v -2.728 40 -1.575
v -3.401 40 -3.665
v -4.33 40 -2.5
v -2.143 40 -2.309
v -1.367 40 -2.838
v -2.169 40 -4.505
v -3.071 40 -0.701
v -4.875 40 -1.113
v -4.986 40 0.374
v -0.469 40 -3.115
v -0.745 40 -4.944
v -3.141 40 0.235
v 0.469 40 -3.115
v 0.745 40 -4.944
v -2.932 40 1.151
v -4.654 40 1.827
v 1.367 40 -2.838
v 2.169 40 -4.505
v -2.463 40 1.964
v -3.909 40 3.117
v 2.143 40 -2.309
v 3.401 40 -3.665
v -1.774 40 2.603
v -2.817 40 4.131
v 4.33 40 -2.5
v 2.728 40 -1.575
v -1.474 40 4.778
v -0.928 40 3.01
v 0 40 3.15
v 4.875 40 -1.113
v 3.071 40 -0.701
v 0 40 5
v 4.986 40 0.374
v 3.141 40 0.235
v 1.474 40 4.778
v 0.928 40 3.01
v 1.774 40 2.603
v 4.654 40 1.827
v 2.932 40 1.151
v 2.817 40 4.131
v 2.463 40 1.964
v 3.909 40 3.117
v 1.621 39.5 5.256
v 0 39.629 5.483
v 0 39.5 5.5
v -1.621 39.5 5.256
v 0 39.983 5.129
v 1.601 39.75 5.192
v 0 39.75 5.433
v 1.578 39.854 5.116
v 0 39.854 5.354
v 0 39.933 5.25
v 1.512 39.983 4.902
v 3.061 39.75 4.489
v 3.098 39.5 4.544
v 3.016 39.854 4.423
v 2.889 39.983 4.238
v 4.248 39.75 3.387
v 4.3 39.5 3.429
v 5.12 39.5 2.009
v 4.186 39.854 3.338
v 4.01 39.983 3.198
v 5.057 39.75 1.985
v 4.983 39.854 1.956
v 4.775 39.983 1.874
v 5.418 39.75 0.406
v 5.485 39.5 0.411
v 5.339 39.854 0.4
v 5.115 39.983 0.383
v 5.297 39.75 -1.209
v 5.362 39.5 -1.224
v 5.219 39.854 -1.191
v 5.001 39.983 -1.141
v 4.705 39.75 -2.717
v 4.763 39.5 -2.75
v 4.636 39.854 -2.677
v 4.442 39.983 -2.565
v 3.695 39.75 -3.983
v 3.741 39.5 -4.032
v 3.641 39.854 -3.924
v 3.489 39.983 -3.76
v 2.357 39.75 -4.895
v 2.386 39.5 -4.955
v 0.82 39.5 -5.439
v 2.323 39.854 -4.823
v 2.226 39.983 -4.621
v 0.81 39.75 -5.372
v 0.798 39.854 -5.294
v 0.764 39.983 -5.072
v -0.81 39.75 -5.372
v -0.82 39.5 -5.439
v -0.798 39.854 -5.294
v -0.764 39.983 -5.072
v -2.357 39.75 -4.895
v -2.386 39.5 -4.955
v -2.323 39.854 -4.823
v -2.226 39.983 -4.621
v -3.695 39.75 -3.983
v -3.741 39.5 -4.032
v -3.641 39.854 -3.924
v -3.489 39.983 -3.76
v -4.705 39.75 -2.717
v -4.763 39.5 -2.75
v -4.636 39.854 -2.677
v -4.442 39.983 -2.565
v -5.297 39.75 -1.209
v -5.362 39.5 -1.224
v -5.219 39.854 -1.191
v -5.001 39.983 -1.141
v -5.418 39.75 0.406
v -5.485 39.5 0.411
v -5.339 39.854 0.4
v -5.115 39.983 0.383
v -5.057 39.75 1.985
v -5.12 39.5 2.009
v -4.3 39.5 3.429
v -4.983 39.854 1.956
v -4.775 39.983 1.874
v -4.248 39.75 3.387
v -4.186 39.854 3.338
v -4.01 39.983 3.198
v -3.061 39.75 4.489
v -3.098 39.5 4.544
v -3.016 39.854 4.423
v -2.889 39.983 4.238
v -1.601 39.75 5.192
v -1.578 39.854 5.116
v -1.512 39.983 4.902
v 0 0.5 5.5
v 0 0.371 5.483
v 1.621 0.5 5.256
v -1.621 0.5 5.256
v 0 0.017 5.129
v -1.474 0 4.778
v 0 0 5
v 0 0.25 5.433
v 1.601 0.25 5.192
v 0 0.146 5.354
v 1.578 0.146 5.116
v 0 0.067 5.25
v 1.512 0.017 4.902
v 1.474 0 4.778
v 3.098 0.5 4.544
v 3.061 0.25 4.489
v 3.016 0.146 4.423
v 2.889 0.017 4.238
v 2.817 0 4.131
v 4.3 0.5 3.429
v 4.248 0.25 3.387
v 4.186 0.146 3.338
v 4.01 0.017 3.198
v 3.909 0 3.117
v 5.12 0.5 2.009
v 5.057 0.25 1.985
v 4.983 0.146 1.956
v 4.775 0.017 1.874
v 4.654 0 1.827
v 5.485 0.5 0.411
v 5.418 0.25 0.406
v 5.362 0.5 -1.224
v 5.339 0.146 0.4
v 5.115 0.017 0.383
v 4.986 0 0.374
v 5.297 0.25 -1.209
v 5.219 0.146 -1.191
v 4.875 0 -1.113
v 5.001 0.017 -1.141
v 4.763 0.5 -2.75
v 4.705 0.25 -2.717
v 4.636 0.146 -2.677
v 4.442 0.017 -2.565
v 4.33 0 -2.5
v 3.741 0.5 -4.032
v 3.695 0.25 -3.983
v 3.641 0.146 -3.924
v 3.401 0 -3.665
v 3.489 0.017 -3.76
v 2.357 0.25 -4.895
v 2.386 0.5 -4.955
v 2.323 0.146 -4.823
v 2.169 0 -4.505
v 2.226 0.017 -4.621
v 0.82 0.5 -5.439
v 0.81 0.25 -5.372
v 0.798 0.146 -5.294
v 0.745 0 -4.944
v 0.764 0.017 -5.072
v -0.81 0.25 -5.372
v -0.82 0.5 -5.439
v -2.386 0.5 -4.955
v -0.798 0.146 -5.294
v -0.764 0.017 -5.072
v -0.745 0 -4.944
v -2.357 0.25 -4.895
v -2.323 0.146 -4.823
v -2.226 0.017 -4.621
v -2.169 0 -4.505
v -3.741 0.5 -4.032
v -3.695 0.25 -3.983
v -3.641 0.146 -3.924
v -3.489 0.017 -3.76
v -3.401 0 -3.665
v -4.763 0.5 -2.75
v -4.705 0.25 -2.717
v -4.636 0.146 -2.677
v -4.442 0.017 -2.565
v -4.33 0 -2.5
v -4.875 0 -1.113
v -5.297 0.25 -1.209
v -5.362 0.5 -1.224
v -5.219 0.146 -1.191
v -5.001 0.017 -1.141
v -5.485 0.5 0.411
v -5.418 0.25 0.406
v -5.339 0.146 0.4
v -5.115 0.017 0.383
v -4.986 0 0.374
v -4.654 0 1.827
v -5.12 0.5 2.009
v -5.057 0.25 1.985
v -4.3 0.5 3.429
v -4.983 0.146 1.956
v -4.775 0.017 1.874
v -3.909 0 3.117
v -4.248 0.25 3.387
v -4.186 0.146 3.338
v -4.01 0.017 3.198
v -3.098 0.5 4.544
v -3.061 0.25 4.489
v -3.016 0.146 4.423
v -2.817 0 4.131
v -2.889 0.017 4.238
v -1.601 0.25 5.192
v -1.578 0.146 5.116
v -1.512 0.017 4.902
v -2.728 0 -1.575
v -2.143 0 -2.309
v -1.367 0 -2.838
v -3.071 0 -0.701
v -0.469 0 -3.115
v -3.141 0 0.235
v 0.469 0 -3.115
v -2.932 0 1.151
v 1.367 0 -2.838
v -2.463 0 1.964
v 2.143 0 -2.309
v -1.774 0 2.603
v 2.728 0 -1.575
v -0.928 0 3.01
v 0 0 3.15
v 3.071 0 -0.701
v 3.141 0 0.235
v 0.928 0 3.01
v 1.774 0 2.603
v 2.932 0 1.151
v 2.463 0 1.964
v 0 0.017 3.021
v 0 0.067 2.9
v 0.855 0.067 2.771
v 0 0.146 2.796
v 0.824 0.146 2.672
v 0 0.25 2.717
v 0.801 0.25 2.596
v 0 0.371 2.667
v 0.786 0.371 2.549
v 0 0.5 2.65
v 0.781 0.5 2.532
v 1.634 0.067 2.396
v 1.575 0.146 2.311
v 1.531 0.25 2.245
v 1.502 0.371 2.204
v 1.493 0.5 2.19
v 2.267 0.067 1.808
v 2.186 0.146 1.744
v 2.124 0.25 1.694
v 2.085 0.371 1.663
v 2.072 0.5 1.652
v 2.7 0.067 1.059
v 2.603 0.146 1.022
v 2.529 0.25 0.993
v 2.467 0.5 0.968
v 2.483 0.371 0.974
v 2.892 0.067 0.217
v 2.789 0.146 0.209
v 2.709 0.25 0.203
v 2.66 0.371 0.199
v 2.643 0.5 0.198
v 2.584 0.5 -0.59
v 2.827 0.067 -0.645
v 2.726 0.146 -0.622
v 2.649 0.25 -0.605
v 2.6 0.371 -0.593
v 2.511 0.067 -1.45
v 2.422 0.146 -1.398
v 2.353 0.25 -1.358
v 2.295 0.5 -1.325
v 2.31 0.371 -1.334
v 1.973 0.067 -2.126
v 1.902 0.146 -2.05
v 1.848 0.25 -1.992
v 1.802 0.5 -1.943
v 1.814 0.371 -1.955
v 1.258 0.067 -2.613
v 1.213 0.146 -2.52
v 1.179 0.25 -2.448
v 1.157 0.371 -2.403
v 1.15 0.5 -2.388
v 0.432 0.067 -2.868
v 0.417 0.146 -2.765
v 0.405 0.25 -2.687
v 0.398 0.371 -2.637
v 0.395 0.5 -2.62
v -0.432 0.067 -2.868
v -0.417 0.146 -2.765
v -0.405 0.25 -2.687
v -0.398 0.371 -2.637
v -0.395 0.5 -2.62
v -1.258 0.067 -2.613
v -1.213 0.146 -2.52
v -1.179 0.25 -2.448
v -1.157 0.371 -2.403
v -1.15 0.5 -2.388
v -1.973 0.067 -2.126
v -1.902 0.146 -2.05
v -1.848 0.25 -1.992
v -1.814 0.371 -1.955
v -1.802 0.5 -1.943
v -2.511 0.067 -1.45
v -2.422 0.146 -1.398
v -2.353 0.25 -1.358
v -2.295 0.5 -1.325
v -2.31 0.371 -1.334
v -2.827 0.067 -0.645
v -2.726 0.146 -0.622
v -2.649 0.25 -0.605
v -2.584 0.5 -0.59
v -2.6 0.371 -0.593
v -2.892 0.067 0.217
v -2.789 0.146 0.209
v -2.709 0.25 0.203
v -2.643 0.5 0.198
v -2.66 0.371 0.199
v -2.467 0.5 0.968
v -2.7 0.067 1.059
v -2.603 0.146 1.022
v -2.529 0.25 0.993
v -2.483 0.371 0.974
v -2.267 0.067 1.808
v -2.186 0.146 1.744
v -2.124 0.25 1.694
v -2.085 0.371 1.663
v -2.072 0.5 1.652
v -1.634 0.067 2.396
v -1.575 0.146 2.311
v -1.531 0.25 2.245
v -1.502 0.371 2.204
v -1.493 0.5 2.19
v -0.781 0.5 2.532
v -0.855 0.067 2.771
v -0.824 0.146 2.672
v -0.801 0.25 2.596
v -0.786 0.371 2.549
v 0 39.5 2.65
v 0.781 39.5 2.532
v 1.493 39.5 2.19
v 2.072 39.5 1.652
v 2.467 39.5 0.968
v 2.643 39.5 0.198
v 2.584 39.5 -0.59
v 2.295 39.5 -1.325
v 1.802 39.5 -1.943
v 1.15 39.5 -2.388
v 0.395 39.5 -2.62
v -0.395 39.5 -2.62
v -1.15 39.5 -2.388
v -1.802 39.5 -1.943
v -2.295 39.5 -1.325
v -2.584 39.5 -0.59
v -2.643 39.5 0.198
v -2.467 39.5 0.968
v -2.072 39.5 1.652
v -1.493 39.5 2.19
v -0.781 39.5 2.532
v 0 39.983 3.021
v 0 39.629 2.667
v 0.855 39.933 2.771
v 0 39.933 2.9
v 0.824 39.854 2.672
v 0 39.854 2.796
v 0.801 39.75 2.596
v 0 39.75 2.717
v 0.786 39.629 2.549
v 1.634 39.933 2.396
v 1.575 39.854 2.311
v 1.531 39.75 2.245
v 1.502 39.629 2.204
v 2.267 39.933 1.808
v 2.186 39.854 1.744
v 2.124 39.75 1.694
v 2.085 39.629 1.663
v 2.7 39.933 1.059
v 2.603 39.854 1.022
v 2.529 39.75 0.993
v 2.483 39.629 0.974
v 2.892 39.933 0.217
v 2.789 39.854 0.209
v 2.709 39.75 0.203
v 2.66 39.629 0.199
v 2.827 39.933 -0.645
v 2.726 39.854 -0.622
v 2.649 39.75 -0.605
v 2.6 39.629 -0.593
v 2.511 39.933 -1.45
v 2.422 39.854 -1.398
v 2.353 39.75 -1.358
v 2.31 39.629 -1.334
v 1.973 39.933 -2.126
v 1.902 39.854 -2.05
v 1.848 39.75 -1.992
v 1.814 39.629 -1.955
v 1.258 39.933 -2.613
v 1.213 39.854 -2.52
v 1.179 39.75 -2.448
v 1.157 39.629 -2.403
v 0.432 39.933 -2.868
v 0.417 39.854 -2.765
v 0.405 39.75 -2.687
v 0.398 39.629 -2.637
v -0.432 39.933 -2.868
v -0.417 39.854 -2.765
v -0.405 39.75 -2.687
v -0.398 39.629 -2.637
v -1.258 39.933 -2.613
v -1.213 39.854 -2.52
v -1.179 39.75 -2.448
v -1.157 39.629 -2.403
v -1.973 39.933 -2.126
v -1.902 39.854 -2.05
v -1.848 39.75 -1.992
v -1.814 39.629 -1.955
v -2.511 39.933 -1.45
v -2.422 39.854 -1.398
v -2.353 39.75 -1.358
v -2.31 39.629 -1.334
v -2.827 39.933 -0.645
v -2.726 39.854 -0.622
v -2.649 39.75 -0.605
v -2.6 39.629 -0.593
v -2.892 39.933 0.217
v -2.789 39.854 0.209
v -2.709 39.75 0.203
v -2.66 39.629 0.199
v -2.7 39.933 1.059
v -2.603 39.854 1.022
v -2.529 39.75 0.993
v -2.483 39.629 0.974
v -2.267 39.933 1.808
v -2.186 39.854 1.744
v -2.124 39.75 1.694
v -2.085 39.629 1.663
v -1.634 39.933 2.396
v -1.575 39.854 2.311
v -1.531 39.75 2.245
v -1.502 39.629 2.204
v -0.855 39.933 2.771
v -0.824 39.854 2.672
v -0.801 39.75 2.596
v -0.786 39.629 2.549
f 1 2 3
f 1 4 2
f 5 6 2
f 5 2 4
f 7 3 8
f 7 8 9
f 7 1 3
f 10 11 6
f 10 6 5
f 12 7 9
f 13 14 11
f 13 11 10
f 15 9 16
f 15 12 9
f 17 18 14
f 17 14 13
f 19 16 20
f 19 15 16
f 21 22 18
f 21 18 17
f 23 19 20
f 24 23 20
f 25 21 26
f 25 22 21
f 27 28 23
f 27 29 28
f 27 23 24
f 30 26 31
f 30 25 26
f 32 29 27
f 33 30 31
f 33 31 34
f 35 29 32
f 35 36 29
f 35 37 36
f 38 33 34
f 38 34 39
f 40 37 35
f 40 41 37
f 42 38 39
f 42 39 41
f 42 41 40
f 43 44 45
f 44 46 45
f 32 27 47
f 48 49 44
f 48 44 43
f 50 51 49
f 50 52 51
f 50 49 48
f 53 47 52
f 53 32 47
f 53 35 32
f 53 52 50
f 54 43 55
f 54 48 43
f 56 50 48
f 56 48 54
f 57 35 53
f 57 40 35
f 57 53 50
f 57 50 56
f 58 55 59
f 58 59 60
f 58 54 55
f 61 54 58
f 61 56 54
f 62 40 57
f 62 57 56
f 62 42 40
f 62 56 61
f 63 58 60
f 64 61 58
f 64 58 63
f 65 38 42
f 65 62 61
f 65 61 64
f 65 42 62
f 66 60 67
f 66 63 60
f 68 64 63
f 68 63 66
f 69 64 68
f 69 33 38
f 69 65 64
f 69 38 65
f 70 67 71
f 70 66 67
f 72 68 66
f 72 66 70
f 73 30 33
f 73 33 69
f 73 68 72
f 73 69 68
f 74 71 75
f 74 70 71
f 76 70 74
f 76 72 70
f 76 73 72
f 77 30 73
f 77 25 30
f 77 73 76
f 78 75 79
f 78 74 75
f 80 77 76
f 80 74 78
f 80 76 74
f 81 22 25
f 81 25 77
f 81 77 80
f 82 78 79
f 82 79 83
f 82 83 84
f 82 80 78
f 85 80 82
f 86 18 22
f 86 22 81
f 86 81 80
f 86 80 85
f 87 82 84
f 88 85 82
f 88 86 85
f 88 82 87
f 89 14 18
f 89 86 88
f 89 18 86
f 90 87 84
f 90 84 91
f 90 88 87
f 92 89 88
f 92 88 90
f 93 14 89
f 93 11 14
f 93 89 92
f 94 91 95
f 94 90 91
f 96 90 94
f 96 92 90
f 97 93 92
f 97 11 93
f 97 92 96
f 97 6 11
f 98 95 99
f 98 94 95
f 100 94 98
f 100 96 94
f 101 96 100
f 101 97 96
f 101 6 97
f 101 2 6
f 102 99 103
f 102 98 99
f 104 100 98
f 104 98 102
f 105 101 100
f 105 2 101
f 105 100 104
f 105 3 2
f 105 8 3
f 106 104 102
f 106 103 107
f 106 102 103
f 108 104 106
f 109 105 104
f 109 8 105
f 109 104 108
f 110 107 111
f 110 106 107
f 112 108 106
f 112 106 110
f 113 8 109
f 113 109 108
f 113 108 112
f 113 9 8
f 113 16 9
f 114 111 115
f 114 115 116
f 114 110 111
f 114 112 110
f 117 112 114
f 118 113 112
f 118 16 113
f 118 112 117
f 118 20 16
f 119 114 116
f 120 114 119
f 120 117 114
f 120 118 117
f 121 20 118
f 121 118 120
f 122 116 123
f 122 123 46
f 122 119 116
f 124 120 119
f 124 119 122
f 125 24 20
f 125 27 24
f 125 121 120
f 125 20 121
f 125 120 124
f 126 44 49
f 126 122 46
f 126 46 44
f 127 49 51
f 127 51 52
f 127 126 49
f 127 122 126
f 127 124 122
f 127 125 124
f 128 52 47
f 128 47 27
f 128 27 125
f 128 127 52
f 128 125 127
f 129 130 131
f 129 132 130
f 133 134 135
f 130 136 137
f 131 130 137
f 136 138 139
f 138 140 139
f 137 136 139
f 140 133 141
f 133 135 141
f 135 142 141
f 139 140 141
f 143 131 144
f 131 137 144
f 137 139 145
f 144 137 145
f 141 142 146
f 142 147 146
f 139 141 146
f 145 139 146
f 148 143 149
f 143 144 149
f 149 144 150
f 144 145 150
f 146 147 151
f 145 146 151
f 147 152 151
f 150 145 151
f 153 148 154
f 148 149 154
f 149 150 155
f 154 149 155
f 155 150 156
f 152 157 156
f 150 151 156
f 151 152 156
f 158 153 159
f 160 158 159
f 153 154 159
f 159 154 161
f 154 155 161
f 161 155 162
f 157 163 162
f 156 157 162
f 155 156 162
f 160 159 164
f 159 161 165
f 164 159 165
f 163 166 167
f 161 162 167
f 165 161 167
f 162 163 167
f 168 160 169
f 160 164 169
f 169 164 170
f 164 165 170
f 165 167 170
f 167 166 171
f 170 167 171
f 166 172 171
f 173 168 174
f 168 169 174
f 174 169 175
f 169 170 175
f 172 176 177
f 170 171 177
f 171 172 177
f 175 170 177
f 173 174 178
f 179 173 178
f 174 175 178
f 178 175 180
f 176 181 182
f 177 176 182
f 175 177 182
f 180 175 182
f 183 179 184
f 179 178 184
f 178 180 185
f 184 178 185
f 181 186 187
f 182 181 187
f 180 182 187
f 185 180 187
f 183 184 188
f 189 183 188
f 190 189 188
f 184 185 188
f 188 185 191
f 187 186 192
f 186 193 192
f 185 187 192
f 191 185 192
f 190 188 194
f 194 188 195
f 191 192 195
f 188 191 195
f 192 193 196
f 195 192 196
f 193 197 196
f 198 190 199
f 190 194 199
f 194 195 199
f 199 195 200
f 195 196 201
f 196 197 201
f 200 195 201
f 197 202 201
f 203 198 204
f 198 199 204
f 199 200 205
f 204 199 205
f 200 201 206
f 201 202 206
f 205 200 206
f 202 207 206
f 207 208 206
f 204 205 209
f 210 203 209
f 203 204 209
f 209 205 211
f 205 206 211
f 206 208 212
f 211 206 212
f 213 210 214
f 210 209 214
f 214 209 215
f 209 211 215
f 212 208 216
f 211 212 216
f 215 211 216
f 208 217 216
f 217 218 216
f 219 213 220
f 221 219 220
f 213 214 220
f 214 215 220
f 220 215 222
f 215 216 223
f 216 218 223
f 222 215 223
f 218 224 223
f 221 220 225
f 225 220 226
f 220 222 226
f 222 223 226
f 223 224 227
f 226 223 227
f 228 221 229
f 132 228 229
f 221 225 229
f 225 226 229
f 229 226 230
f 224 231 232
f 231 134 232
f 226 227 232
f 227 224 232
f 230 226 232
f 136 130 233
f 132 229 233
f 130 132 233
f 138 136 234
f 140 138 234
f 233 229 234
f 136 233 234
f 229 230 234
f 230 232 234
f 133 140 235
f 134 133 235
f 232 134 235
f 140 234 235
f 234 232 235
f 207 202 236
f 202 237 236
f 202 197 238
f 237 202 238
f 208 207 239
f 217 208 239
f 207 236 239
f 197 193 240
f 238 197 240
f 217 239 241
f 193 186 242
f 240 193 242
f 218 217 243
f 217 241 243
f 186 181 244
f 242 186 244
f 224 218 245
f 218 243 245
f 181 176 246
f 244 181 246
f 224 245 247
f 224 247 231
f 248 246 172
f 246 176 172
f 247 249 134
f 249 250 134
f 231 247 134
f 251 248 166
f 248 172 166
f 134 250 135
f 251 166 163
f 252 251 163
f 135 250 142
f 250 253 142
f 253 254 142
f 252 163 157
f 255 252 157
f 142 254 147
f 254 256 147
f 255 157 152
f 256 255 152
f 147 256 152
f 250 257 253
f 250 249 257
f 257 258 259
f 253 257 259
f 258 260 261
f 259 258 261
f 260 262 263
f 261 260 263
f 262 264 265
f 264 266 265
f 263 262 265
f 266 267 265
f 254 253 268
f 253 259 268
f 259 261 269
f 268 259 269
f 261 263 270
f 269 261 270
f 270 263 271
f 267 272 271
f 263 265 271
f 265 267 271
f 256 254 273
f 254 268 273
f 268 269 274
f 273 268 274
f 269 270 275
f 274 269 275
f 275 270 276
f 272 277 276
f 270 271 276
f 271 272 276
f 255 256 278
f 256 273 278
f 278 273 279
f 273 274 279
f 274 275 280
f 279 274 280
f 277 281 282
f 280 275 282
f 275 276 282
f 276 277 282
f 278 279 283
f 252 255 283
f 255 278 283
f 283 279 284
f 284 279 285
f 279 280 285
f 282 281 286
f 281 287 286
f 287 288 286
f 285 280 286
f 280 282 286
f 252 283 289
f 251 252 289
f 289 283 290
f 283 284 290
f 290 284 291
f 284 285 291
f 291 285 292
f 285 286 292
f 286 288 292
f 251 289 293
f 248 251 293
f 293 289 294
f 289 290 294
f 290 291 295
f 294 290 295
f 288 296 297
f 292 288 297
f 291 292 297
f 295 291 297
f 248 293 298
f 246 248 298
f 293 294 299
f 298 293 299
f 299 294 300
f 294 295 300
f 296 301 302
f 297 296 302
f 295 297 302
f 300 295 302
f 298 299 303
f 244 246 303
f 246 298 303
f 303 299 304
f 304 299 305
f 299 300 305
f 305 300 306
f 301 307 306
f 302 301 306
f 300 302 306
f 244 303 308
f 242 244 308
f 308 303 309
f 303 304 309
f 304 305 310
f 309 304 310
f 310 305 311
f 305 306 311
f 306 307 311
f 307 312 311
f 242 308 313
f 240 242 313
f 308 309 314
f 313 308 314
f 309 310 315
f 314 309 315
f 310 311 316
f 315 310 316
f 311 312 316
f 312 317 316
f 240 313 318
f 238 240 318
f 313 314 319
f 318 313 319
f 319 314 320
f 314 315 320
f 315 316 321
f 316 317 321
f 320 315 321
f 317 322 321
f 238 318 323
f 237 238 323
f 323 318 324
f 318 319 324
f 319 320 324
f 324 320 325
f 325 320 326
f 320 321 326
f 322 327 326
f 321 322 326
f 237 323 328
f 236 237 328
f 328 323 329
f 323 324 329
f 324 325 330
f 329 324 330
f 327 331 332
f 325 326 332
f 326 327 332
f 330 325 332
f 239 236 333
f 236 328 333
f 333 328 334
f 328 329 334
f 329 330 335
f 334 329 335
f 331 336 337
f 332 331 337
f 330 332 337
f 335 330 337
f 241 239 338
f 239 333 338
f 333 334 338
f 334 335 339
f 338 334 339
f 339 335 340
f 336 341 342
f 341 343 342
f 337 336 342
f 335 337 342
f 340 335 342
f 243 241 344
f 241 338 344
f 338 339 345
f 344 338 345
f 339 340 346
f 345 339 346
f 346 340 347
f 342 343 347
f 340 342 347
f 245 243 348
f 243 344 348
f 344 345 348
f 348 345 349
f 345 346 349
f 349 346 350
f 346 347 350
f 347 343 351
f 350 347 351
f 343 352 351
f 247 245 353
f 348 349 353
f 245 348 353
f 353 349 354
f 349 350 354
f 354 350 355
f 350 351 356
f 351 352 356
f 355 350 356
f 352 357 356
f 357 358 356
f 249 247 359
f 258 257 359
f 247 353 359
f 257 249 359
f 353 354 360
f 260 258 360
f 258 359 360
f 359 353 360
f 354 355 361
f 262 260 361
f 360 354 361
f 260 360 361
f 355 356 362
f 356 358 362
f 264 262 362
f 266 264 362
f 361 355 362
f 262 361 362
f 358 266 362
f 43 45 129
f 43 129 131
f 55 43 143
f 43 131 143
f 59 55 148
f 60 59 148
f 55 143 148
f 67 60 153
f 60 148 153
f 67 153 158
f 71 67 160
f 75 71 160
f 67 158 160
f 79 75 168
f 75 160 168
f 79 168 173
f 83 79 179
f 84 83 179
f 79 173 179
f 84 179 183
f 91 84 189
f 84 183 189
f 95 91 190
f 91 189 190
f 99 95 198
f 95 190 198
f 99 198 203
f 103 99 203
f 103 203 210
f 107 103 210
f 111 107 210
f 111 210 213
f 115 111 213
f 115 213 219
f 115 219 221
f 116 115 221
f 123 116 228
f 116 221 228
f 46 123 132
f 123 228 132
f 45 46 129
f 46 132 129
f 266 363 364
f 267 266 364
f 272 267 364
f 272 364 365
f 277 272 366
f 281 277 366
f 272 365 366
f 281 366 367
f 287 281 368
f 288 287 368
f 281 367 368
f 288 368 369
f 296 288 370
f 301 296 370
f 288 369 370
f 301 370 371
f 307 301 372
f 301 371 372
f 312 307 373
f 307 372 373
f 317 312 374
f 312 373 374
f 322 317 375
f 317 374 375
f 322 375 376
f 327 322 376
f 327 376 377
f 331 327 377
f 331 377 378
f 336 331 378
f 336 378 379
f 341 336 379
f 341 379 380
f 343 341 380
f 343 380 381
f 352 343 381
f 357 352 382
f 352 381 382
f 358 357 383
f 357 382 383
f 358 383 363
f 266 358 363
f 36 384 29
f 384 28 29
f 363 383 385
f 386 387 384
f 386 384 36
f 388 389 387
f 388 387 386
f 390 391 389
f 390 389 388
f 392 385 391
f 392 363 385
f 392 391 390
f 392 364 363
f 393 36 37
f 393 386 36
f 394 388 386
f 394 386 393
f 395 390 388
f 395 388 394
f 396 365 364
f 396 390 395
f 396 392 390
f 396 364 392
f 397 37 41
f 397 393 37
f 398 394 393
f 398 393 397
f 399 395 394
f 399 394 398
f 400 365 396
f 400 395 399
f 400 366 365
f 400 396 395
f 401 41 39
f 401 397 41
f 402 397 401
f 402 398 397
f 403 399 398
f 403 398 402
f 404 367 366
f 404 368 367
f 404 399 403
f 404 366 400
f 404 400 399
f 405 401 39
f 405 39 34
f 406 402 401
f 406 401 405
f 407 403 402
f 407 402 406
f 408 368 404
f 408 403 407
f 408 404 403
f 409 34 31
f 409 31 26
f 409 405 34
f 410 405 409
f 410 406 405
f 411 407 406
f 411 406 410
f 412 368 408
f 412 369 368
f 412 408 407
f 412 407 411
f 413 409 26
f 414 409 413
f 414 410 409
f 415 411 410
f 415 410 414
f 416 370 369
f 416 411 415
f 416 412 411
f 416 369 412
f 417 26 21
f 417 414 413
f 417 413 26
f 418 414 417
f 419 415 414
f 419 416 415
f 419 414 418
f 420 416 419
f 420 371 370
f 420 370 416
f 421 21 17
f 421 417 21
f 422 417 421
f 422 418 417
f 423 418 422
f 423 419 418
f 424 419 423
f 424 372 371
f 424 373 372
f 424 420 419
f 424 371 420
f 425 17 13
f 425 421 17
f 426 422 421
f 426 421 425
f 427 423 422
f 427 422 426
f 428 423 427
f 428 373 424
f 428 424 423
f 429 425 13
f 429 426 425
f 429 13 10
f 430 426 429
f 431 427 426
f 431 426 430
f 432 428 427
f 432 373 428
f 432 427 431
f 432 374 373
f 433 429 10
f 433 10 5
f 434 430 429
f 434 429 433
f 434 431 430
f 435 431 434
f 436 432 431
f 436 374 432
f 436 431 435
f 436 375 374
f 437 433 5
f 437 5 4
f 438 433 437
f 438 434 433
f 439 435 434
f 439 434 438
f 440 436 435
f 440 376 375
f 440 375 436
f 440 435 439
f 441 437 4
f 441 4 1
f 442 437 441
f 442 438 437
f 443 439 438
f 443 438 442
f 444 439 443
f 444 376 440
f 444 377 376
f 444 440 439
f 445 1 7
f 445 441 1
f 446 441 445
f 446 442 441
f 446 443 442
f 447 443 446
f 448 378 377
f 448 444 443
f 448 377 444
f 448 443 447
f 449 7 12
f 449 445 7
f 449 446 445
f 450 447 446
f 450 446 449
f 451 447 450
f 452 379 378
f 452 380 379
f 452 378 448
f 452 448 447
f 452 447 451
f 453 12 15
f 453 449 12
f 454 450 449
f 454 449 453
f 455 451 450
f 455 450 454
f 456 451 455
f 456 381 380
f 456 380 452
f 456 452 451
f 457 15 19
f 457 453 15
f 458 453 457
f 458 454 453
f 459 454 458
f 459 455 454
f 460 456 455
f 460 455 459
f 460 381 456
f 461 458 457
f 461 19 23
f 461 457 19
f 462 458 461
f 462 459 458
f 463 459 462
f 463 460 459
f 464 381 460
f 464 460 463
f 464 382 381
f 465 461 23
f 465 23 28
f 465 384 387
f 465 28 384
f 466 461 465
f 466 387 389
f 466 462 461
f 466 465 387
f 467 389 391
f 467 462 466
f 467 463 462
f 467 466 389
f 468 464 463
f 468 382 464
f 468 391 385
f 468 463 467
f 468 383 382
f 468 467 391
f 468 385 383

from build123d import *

# Parameters (mm, degrees)
ESBO_O1_R                = 5.5
RESSALTO_EXTRUS_O1_DEPTH = 40
ESBO_O2_R                = 2.65
CORTE_EXTRUS_O1_DEPTH    = 40
FILETE1_R                = 0.5
FILETE2_R                = 0.5


with BuildPart() as part:
    # Esboço1 → Ressalto-extrusão1 (new body)
    with BuildSketch(Plane(origin=(0, 0, 0), x_dir=(1, 0, 0), z_dir=(0, 1, 0))):
        with Locations(Location((0, 0, 0), (0, 0, 270))):
            Circle(ESBO_O1_R)
    extrude(amount=RESSALTO_EXTRUS_O1_DEPTH)

    # Esboço2 → Corte-extrusão1 (cut)
    with BuildSketch(Plane(origin=(0, 40, 0), x_dir=(1, 0, 0), z_dir=(0, 1, 0))):
        with Locations(Location((0, 0, 0), (0, 0, 270))):
            Circle(ESBO_O2_R)
    extrude(amount=-CORTE_EXTRUS_O1_DEPTH, mode=Mode.SUBTRACT)

    # Filete1
    filete1_edges = [part.edges().sort_by_distance(p)[0] for p in [
        (0, 0, -5.5),
        (0, 40, -5.5),
    ]]
    fillet(filete1_edges, radius=FILETE1_R)

    # Filete2
    filete2_edges = [part.edges().sort_by_distance(p)[0] for p in [
        (0, 0, -2.65),
        (0, 40, -2.65),
    ]]
    fillet(filete2_edges, radius=FILETE2_R)


solid = part.part
